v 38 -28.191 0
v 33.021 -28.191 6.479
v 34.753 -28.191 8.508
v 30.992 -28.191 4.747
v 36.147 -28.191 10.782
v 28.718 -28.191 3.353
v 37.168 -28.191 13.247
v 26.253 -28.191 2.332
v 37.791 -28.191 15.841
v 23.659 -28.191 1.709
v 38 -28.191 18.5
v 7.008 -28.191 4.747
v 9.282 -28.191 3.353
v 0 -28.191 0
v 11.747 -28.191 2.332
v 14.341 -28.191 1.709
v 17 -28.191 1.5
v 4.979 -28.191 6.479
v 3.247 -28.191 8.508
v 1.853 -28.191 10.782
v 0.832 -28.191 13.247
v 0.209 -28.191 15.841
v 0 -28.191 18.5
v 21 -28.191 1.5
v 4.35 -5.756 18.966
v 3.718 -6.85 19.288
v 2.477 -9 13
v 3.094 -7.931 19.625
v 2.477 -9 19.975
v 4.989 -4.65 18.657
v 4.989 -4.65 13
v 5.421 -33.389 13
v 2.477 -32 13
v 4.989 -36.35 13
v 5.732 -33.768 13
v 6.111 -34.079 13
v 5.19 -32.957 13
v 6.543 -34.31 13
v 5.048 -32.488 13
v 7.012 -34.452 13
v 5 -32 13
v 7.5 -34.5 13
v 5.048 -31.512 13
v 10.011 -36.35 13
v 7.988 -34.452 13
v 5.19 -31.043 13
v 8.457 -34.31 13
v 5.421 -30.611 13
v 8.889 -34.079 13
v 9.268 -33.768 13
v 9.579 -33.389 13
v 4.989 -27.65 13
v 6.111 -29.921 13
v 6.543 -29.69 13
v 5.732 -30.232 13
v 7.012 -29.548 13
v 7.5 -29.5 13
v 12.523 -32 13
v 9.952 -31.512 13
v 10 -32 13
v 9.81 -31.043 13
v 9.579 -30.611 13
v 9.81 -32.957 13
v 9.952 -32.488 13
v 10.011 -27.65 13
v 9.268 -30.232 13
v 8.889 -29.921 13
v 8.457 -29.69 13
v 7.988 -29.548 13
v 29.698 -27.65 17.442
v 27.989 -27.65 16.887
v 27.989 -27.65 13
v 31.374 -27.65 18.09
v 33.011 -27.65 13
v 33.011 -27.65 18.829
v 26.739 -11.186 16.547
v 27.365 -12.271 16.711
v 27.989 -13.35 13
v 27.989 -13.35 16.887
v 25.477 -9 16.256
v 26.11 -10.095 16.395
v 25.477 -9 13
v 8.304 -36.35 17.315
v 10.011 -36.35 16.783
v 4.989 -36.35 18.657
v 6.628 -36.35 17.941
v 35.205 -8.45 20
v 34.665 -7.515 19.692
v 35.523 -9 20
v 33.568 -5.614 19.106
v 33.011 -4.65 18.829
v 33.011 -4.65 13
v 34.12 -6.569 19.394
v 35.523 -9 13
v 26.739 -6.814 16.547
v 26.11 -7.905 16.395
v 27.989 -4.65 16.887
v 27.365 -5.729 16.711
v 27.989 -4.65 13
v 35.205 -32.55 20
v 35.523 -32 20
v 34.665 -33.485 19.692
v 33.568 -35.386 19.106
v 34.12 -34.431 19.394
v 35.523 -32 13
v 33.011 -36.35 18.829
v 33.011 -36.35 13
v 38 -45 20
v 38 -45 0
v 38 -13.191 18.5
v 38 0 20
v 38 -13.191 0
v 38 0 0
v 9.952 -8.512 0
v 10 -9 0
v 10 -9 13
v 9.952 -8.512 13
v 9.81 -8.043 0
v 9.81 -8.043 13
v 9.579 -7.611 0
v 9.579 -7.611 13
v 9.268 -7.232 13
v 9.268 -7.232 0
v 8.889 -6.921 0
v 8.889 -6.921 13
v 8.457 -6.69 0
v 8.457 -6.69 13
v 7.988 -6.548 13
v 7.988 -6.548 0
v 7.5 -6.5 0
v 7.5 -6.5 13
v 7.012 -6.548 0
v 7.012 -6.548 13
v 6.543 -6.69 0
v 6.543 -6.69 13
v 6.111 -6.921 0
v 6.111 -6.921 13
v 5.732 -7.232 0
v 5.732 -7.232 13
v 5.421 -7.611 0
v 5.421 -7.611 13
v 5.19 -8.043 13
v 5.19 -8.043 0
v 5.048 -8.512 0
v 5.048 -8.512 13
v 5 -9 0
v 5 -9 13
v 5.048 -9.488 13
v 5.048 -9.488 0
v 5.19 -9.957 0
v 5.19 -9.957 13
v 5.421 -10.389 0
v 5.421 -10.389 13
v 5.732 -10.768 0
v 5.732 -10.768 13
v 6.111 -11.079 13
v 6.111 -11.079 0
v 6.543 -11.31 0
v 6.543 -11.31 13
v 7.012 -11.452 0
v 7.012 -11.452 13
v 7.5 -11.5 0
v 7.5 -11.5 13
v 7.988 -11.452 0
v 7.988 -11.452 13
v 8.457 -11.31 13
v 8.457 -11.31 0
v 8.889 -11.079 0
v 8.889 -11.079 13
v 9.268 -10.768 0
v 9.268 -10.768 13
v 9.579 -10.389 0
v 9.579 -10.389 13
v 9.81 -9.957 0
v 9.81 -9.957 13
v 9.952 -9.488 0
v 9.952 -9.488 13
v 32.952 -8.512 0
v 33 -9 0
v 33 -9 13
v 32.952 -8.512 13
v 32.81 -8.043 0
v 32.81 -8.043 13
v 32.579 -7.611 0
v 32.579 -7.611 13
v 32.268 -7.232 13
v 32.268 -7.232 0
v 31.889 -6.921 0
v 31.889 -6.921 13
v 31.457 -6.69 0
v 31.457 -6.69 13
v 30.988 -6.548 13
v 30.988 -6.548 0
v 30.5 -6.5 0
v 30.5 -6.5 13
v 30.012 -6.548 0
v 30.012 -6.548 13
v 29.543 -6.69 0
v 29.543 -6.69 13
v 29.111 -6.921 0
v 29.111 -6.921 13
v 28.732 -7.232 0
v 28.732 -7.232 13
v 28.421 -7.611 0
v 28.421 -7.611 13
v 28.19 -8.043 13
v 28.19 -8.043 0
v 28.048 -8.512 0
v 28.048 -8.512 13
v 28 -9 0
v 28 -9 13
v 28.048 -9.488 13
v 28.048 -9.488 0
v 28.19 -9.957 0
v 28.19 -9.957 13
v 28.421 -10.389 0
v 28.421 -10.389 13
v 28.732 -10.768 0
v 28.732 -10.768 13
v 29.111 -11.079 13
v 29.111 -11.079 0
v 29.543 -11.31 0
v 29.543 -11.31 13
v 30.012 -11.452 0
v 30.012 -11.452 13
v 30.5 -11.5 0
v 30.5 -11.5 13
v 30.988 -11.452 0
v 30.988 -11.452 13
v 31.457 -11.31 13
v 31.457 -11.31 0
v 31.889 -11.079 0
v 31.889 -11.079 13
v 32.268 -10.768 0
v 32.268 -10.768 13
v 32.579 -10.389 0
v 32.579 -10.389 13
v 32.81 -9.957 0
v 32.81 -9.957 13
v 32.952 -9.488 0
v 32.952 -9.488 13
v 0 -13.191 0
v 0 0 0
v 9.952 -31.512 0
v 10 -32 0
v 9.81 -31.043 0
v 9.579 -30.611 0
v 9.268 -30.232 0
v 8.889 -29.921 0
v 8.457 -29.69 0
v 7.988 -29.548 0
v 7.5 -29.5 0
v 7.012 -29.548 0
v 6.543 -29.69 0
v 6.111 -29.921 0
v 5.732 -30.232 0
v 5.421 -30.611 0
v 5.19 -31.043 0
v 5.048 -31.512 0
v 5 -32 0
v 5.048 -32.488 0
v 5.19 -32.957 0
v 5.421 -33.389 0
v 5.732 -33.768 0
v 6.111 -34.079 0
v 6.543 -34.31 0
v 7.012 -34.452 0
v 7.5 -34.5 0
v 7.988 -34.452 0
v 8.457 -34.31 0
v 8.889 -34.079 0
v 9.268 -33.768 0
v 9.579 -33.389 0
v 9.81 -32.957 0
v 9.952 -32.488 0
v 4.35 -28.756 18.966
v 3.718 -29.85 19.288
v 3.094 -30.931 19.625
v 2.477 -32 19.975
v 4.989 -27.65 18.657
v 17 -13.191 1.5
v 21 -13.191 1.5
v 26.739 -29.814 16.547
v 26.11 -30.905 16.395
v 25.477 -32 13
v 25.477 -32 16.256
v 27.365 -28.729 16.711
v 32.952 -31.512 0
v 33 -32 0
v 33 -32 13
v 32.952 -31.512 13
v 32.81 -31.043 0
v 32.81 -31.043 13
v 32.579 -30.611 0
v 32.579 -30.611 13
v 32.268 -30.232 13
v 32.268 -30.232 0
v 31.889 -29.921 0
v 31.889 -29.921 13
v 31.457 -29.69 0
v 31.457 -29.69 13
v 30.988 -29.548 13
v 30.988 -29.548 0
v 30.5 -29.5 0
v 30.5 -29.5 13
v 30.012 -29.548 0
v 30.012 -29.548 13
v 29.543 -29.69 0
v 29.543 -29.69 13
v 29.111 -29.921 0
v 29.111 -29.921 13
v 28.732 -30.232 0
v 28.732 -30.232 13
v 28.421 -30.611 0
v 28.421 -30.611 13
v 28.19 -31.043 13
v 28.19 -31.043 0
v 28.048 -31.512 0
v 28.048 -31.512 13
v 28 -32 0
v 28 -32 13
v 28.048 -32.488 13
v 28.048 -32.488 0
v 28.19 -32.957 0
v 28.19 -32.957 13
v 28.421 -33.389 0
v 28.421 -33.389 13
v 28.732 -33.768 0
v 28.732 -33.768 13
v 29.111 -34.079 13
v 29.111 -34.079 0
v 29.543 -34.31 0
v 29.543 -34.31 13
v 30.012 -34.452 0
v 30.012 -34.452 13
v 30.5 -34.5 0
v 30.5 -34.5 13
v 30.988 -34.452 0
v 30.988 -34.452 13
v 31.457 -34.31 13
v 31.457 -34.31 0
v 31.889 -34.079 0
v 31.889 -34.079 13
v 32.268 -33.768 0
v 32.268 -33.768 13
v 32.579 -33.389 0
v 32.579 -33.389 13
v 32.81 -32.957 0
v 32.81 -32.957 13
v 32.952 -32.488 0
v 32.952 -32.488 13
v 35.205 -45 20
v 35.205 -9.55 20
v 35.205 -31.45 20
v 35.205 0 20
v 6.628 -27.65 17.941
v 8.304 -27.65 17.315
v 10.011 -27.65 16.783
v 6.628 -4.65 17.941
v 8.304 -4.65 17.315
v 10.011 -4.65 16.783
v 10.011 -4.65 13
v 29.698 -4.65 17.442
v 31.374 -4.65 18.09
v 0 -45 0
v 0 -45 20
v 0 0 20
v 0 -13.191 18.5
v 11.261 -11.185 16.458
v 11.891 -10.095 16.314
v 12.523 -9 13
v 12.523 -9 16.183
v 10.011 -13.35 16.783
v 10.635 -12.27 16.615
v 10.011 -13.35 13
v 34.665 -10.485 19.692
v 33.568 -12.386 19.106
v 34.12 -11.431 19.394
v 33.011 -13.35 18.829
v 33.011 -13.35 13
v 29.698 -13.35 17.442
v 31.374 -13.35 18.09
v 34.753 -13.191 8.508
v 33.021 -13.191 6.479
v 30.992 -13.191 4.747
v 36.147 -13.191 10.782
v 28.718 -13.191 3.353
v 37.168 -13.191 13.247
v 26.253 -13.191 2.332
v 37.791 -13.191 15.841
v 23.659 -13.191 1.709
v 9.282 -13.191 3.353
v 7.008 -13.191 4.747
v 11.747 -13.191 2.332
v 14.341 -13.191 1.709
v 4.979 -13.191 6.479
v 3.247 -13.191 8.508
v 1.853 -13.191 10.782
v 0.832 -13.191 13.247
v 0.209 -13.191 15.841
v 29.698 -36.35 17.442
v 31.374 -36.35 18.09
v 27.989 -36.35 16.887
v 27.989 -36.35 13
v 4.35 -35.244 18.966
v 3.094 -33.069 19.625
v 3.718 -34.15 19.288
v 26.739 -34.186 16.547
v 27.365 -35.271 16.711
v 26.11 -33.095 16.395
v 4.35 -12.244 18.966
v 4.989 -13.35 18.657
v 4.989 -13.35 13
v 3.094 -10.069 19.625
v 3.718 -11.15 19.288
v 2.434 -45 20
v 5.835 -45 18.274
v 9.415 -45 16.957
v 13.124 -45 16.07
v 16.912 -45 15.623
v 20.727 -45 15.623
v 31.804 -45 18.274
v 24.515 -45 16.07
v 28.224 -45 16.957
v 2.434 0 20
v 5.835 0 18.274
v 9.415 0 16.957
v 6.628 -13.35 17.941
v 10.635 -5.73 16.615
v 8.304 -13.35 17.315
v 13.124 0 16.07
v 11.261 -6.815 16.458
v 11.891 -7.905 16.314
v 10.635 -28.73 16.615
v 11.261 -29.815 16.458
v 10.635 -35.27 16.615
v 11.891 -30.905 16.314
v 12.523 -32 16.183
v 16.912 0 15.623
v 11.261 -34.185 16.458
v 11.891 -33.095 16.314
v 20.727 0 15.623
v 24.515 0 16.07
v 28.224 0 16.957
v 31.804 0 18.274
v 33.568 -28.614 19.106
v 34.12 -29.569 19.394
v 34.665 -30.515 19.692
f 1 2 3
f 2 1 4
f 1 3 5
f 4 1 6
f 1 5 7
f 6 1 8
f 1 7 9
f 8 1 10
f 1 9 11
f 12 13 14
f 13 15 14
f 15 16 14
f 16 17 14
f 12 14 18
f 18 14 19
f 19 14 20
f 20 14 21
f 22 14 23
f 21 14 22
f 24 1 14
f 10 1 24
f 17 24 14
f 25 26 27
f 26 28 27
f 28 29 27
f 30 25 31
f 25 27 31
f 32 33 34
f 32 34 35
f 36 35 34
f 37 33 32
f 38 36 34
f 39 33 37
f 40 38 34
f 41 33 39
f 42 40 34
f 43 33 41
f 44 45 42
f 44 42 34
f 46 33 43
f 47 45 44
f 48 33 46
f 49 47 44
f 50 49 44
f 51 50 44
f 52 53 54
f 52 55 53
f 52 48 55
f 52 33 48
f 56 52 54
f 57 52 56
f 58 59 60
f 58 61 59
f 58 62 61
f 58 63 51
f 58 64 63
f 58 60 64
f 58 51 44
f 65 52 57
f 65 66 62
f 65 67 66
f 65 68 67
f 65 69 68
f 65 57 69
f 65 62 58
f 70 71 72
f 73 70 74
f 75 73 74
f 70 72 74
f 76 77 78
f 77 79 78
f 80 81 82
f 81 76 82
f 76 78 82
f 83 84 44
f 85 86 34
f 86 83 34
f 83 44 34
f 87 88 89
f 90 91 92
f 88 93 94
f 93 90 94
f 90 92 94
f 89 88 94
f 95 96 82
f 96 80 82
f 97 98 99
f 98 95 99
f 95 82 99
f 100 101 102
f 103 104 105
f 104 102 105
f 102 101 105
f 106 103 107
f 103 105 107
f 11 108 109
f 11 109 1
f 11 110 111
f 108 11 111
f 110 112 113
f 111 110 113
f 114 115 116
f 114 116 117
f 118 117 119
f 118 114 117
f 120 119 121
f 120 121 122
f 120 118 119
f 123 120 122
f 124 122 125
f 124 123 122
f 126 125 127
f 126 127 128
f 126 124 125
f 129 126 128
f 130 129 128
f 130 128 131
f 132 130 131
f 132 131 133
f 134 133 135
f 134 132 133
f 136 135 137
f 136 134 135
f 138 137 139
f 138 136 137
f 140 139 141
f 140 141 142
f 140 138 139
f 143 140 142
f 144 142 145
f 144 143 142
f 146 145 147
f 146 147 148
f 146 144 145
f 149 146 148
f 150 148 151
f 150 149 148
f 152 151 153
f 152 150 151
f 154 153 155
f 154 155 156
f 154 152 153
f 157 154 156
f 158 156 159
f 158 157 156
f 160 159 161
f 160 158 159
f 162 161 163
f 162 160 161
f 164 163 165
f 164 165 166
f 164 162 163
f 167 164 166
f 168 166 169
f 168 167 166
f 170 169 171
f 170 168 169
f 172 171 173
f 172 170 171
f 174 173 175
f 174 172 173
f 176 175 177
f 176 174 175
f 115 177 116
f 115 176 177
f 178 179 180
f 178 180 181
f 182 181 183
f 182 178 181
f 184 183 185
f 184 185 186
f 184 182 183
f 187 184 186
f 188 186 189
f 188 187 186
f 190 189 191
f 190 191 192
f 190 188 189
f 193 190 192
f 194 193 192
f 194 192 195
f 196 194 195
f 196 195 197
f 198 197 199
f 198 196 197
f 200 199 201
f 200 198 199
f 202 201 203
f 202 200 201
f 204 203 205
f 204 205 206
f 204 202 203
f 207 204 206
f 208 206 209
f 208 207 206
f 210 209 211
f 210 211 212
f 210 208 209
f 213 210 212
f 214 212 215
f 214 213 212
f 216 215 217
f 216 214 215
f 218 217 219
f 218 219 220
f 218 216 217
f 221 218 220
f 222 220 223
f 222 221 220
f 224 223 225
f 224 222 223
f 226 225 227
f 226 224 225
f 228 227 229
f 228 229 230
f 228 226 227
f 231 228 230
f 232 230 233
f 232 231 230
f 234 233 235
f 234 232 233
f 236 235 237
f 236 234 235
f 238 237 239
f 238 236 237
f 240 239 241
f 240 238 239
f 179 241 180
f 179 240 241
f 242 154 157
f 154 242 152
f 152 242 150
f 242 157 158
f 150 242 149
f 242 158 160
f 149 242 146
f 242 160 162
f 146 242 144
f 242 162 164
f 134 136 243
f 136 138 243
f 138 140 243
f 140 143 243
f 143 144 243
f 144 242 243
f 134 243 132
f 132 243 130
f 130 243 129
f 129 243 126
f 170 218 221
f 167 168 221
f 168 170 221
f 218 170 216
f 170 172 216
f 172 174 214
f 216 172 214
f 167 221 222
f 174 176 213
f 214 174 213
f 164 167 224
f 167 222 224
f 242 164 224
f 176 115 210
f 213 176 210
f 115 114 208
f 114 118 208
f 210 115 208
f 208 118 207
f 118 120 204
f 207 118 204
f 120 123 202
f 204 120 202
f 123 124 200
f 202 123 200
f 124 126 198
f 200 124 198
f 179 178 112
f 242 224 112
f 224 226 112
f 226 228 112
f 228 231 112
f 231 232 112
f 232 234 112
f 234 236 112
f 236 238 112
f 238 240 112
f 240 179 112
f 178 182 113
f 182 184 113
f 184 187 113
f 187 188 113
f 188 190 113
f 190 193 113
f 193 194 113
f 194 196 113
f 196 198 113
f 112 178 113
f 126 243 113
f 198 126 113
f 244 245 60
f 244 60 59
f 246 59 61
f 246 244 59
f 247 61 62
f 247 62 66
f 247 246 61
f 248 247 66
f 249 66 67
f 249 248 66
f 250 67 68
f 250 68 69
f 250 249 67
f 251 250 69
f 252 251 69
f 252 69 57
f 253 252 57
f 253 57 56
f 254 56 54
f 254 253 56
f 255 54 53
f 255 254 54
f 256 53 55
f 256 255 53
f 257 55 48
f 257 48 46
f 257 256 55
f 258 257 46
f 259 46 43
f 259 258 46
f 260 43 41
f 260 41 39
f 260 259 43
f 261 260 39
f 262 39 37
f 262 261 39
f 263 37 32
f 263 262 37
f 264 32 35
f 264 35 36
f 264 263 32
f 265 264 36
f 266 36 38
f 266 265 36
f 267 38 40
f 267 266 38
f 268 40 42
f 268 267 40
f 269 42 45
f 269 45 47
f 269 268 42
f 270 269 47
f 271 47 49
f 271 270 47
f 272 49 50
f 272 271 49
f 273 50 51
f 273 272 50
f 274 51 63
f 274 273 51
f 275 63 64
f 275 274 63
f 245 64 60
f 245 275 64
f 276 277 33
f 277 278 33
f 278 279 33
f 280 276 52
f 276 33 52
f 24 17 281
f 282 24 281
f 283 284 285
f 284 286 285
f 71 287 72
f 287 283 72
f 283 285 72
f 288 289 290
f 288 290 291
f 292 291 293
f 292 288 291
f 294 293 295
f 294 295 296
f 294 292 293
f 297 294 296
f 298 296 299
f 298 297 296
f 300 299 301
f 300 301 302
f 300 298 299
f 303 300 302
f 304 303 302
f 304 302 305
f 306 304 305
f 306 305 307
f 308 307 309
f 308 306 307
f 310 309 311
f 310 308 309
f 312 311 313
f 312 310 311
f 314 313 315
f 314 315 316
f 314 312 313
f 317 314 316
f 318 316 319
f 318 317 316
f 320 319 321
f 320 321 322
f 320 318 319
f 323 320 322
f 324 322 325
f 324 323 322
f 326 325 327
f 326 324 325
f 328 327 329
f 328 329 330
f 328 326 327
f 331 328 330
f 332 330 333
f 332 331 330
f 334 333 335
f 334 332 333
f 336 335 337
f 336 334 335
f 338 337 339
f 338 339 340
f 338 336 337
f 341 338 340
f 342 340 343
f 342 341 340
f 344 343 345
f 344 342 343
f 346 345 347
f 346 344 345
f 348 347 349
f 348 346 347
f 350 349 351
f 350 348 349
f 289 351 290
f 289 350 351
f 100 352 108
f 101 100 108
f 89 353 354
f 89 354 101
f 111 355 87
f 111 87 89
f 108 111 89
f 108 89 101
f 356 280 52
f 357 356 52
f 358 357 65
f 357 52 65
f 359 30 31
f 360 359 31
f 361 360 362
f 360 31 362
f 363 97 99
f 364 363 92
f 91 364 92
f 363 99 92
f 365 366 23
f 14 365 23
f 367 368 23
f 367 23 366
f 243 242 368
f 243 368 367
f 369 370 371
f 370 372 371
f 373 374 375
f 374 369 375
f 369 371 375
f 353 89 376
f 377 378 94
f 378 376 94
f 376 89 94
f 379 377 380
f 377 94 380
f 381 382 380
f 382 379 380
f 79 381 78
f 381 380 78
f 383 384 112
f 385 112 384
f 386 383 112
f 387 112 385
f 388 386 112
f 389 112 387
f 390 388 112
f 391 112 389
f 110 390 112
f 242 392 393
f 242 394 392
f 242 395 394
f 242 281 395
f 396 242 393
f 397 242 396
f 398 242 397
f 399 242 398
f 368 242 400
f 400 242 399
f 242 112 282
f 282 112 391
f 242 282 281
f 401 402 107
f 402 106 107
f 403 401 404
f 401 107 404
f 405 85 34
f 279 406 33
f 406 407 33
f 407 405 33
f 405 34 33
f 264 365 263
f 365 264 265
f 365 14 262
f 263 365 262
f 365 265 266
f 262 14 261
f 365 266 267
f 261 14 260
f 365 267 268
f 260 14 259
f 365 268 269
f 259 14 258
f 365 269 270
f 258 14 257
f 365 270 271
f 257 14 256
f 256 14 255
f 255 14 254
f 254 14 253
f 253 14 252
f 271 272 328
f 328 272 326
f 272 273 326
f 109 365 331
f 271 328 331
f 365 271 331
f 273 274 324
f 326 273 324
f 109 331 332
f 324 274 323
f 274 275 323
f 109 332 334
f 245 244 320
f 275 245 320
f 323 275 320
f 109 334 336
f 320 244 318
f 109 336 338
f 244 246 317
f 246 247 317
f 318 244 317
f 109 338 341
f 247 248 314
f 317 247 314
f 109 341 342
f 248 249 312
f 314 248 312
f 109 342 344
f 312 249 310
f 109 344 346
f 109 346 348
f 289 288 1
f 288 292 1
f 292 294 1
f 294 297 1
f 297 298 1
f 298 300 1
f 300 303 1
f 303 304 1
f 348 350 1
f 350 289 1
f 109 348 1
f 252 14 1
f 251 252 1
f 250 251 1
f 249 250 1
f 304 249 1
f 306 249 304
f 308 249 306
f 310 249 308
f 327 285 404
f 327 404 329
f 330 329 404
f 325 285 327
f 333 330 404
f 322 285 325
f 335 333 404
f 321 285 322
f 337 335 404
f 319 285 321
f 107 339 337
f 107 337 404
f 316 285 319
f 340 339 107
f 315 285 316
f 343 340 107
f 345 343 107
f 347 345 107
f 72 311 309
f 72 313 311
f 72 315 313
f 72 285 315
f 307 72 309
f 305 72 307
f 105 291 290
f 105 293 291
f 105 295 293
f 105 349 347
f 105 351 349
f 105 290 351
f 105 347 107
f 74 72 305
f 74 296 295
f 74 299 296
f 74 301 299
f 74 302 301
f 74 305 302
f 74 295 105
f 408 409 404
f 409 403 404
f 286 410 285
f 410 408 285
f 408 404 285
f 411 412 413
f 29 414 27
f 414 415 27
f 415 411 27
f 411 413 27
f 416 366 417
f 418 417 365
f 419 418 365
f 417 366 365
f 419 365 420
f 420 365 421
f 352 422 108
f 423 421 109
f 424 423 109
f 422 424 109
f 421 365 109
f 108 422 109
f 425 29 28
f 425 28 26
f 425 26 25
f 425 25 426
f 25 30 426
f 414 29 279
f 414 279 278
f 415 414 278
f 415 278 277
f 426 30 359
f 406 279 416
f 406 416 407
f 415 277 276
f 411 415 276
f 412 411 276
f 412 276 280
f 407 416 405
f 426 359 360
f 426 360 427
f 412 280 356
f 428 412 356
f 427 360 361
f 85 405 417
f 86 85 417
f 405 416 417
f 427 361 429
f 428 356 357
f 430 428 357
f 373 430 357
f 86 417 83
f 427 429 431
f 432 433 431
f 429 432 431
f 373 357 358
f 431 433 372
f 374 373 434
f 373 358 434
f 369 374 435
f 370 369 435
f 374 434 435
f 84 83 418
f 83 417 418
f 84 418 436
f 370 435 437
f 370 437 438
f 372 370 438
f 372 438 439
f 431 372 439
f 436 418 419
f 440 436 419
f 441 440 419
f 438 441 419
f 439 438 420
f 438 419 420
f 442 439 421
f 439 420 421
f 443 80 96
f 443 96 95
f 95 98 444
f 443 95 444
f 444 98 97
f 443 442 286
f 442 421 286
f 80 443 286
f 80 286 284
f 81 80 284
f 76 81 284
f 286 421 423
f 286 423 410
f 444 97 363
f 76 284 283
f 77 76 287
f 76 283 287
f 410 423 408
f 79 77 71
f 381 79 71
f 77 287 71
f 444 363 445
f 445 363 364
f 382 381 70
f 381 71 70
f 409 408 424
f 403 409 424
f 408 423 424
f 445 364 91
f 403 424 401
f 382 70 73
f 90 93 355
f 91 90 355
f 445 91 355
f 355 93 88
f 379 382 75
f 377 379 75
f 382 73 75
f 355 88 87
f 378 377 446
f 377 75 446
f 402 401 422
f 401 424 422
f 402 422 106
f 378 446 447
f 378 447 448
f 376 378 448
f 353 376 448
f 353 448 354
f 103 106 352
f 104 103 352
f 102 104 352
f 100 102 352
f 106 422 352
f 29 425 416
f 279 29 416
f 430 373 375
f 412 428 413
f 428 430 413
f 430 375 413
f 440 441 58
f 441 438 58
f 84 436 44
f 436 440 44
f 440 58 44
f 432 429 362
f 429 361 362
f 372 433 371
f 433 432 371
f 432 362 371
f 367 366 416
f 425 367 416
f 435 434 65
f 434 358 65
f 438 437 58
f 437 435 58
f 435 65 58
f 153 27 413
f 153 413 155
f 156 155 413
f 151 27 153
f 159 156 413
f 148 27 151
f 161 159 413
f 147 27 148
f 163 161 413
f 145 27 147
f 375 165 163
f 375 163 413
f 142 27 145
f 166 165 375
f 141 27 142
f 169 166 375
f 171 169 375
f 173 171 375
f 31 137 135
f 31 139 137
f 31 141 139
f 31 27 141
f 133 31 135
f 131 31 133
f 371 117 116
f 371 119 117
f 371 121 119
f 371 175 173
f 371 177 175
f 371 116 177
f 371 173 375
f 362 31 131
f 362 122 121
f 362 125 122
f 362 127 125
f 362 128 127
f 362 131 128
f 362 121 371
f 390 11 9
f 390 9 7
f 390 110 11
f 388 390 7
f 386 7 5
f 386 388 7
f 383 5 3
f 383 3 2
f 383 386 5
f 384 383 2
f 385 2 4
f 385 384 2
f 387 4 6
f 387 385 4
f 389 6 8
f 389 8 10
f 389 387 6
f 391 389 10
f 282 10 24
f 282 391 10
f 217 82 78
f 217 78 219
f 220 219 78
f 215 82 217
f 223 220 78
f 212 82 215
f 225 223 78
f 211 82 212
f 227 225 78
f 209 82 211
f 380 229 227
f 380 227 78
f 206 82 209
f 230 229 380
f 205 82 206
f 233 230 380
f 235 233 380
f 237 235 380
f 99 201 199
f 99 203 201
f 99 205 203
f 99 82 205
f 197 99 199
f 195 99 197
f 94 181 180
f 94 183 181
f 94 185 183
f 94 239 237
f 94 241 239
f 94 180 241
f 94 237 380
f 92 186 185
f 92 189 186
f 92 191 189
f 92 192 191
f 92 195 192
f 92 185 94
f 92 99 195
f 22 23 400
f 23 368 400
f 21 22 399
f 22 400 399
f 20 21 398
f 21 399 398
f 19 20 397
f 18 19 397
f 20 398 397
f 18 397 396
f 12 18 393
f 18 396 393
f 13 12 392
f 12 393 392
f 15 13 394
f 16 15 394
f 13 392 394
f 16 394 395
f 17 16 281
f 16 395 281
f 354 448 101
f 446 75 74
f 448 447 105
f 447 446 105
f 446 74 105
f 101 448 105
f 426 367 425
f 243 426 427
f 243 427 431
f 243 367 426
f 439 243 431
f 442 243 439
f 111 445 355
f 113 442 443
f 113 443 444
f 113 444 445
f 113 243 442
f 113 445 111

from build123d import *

# Parameters (mm, degrees)
F0_W      = 38
F0_H      = 45
F1_DEPTH  = 20
F0_R      = 2.5
F2_DEPTH  = 13
F3_DEPTH  = 13
F4_DEPTH  = 13
F5_DEPTH  = 13
F6_W      = 15
F6_H      = 20
F7_DEPTH  = 40.2
F9_R      = 32.5
F10_DEPTH = 102.8
F11_R     = 17


with BuildPart() as f1:
    # F0 (on Top) → F1 (new body)
    with BuildSketch(Plane.XY):
        with Locations((19, -22.5)):
            Rectangle(F0_W, F0_H)
        Polygon((12.5229473419, -32), (10.011473671, -36.35), (4.988526329, -36.35), (2.4770526581, -32), (4.988526329, -27.65), (10.011473671, -27.65), align=None, mode=Mode.SUBTRACT)
        Polygon((35.5229473419, -32), (33.011473671, -36.35), (27.988526329, -36.35), (25.4770526581, -32), (27.988526329, -27.65), (33.011473671, -27.65), align=None, mode=Mode.SUBTRACT)
        Polygon((2.4770526581, -9), (4.988526329, -4.65), (10.011473671, -4.65), (12.5229473419, -9), (10.011473671, -13.35), (4.988526329, -13.35), align=None, mode=Mode.SUBTRACT)
        Polygon((25.4770526581, -9), (27.988526329, -4.65), (33.011473671, -4.65), (35.5229473419, -9), (33.011473671, -13.35), (27.988526329, -13.35), align=None, mode=Mode.SUBTRACT)
    extrude(amount=F1_DEPTH)

    # F0 (on Top) → F2 (join)
    with BuildSketch(Plane.XY):
        Polygon((10.011473671, -4.65), (4.988526329, -4.65), (2.4770526581, -9), (4.988526329, -13.35), (10.011473671, -13.35), (12.5229473419, -9), align=None)
        with Locations((7.5, -9)):
            Circle(F0_R, mode=Mode.SUBTRACT)
    extrude(amount=F2_DEPTH)

    # F0 (on Top) → F3 (join)
    with BuildSketch(Plane.XY):
        Polygon((33.011473671, -4.65), (27.988526329, -4.65), (25.4770526581, -9), (27.988526329, -13.35), (33.011473671, -13.35), (35.5229473419, -9), align=None)
        with Locations((30.5, -9)):
            Circle(F0_R, mode=Mode.SUBTRACT)
    extrude(amount=F3_DEPTH)

    # F0 (on Top) → F4 (join)
    with BuildSketch(Plane.XY):
        Polygon((4.988526329, -36.35), (10.011473671, -36.35), (12.5229473419, -32), (10.011473671, -27.65), (4.988526329, -27.65), (2.4770526581, -32), align=None)
        with Locations((7.5, -32)):
            Circle(F0_R, mode=Mode.SUBTRACT)
    extrude(amount=F4_DEPTH)

    # F0 (on Top) → F5 (join)
    with BuildSketch(Plane.XY):
        Polygon((27.988526329, -36.35), (33.011473671, -36.35), (35.5229473419, -32), (33.011473671, -27.65), (27.988526329, -27.65), (25.4770526581, -32), align=None)
        with Locations((30.5, -32)):
            Circle(F0_R, mode=Mode.SUBTRACT)
    extrude(amount=F5_DEPTH)

    # F6 (on Right) → F7 (cut)
    with BuildSketch(Plane.YZ):
        with Locations((-20.6906894967, -8.5)):
            Rectangle(F6_W, F6_H)
    extrude(amount=F7_DEPTH, mode=Mode.SUBTRACT)

    # F9 (on offset) → F10 (cut)
    with BuildSketch(Plane.XZ.offset(70)):
        with Locations((18.8195854425, 48.0670109391)):
            Circle(F9_R)
    extrude(amount=-F10_DEPTH, mode=Mode.SUBTRACT)

    # F11
    f11_edges = [f1.edges().sort_by_distance(p)[0] for p in [
        (38, -20.690689, 1.5),
        (0, -20.690689, 1.5),
    ]]
    fillet(f11_edges, radius=F11_R)


solid = f1.part
